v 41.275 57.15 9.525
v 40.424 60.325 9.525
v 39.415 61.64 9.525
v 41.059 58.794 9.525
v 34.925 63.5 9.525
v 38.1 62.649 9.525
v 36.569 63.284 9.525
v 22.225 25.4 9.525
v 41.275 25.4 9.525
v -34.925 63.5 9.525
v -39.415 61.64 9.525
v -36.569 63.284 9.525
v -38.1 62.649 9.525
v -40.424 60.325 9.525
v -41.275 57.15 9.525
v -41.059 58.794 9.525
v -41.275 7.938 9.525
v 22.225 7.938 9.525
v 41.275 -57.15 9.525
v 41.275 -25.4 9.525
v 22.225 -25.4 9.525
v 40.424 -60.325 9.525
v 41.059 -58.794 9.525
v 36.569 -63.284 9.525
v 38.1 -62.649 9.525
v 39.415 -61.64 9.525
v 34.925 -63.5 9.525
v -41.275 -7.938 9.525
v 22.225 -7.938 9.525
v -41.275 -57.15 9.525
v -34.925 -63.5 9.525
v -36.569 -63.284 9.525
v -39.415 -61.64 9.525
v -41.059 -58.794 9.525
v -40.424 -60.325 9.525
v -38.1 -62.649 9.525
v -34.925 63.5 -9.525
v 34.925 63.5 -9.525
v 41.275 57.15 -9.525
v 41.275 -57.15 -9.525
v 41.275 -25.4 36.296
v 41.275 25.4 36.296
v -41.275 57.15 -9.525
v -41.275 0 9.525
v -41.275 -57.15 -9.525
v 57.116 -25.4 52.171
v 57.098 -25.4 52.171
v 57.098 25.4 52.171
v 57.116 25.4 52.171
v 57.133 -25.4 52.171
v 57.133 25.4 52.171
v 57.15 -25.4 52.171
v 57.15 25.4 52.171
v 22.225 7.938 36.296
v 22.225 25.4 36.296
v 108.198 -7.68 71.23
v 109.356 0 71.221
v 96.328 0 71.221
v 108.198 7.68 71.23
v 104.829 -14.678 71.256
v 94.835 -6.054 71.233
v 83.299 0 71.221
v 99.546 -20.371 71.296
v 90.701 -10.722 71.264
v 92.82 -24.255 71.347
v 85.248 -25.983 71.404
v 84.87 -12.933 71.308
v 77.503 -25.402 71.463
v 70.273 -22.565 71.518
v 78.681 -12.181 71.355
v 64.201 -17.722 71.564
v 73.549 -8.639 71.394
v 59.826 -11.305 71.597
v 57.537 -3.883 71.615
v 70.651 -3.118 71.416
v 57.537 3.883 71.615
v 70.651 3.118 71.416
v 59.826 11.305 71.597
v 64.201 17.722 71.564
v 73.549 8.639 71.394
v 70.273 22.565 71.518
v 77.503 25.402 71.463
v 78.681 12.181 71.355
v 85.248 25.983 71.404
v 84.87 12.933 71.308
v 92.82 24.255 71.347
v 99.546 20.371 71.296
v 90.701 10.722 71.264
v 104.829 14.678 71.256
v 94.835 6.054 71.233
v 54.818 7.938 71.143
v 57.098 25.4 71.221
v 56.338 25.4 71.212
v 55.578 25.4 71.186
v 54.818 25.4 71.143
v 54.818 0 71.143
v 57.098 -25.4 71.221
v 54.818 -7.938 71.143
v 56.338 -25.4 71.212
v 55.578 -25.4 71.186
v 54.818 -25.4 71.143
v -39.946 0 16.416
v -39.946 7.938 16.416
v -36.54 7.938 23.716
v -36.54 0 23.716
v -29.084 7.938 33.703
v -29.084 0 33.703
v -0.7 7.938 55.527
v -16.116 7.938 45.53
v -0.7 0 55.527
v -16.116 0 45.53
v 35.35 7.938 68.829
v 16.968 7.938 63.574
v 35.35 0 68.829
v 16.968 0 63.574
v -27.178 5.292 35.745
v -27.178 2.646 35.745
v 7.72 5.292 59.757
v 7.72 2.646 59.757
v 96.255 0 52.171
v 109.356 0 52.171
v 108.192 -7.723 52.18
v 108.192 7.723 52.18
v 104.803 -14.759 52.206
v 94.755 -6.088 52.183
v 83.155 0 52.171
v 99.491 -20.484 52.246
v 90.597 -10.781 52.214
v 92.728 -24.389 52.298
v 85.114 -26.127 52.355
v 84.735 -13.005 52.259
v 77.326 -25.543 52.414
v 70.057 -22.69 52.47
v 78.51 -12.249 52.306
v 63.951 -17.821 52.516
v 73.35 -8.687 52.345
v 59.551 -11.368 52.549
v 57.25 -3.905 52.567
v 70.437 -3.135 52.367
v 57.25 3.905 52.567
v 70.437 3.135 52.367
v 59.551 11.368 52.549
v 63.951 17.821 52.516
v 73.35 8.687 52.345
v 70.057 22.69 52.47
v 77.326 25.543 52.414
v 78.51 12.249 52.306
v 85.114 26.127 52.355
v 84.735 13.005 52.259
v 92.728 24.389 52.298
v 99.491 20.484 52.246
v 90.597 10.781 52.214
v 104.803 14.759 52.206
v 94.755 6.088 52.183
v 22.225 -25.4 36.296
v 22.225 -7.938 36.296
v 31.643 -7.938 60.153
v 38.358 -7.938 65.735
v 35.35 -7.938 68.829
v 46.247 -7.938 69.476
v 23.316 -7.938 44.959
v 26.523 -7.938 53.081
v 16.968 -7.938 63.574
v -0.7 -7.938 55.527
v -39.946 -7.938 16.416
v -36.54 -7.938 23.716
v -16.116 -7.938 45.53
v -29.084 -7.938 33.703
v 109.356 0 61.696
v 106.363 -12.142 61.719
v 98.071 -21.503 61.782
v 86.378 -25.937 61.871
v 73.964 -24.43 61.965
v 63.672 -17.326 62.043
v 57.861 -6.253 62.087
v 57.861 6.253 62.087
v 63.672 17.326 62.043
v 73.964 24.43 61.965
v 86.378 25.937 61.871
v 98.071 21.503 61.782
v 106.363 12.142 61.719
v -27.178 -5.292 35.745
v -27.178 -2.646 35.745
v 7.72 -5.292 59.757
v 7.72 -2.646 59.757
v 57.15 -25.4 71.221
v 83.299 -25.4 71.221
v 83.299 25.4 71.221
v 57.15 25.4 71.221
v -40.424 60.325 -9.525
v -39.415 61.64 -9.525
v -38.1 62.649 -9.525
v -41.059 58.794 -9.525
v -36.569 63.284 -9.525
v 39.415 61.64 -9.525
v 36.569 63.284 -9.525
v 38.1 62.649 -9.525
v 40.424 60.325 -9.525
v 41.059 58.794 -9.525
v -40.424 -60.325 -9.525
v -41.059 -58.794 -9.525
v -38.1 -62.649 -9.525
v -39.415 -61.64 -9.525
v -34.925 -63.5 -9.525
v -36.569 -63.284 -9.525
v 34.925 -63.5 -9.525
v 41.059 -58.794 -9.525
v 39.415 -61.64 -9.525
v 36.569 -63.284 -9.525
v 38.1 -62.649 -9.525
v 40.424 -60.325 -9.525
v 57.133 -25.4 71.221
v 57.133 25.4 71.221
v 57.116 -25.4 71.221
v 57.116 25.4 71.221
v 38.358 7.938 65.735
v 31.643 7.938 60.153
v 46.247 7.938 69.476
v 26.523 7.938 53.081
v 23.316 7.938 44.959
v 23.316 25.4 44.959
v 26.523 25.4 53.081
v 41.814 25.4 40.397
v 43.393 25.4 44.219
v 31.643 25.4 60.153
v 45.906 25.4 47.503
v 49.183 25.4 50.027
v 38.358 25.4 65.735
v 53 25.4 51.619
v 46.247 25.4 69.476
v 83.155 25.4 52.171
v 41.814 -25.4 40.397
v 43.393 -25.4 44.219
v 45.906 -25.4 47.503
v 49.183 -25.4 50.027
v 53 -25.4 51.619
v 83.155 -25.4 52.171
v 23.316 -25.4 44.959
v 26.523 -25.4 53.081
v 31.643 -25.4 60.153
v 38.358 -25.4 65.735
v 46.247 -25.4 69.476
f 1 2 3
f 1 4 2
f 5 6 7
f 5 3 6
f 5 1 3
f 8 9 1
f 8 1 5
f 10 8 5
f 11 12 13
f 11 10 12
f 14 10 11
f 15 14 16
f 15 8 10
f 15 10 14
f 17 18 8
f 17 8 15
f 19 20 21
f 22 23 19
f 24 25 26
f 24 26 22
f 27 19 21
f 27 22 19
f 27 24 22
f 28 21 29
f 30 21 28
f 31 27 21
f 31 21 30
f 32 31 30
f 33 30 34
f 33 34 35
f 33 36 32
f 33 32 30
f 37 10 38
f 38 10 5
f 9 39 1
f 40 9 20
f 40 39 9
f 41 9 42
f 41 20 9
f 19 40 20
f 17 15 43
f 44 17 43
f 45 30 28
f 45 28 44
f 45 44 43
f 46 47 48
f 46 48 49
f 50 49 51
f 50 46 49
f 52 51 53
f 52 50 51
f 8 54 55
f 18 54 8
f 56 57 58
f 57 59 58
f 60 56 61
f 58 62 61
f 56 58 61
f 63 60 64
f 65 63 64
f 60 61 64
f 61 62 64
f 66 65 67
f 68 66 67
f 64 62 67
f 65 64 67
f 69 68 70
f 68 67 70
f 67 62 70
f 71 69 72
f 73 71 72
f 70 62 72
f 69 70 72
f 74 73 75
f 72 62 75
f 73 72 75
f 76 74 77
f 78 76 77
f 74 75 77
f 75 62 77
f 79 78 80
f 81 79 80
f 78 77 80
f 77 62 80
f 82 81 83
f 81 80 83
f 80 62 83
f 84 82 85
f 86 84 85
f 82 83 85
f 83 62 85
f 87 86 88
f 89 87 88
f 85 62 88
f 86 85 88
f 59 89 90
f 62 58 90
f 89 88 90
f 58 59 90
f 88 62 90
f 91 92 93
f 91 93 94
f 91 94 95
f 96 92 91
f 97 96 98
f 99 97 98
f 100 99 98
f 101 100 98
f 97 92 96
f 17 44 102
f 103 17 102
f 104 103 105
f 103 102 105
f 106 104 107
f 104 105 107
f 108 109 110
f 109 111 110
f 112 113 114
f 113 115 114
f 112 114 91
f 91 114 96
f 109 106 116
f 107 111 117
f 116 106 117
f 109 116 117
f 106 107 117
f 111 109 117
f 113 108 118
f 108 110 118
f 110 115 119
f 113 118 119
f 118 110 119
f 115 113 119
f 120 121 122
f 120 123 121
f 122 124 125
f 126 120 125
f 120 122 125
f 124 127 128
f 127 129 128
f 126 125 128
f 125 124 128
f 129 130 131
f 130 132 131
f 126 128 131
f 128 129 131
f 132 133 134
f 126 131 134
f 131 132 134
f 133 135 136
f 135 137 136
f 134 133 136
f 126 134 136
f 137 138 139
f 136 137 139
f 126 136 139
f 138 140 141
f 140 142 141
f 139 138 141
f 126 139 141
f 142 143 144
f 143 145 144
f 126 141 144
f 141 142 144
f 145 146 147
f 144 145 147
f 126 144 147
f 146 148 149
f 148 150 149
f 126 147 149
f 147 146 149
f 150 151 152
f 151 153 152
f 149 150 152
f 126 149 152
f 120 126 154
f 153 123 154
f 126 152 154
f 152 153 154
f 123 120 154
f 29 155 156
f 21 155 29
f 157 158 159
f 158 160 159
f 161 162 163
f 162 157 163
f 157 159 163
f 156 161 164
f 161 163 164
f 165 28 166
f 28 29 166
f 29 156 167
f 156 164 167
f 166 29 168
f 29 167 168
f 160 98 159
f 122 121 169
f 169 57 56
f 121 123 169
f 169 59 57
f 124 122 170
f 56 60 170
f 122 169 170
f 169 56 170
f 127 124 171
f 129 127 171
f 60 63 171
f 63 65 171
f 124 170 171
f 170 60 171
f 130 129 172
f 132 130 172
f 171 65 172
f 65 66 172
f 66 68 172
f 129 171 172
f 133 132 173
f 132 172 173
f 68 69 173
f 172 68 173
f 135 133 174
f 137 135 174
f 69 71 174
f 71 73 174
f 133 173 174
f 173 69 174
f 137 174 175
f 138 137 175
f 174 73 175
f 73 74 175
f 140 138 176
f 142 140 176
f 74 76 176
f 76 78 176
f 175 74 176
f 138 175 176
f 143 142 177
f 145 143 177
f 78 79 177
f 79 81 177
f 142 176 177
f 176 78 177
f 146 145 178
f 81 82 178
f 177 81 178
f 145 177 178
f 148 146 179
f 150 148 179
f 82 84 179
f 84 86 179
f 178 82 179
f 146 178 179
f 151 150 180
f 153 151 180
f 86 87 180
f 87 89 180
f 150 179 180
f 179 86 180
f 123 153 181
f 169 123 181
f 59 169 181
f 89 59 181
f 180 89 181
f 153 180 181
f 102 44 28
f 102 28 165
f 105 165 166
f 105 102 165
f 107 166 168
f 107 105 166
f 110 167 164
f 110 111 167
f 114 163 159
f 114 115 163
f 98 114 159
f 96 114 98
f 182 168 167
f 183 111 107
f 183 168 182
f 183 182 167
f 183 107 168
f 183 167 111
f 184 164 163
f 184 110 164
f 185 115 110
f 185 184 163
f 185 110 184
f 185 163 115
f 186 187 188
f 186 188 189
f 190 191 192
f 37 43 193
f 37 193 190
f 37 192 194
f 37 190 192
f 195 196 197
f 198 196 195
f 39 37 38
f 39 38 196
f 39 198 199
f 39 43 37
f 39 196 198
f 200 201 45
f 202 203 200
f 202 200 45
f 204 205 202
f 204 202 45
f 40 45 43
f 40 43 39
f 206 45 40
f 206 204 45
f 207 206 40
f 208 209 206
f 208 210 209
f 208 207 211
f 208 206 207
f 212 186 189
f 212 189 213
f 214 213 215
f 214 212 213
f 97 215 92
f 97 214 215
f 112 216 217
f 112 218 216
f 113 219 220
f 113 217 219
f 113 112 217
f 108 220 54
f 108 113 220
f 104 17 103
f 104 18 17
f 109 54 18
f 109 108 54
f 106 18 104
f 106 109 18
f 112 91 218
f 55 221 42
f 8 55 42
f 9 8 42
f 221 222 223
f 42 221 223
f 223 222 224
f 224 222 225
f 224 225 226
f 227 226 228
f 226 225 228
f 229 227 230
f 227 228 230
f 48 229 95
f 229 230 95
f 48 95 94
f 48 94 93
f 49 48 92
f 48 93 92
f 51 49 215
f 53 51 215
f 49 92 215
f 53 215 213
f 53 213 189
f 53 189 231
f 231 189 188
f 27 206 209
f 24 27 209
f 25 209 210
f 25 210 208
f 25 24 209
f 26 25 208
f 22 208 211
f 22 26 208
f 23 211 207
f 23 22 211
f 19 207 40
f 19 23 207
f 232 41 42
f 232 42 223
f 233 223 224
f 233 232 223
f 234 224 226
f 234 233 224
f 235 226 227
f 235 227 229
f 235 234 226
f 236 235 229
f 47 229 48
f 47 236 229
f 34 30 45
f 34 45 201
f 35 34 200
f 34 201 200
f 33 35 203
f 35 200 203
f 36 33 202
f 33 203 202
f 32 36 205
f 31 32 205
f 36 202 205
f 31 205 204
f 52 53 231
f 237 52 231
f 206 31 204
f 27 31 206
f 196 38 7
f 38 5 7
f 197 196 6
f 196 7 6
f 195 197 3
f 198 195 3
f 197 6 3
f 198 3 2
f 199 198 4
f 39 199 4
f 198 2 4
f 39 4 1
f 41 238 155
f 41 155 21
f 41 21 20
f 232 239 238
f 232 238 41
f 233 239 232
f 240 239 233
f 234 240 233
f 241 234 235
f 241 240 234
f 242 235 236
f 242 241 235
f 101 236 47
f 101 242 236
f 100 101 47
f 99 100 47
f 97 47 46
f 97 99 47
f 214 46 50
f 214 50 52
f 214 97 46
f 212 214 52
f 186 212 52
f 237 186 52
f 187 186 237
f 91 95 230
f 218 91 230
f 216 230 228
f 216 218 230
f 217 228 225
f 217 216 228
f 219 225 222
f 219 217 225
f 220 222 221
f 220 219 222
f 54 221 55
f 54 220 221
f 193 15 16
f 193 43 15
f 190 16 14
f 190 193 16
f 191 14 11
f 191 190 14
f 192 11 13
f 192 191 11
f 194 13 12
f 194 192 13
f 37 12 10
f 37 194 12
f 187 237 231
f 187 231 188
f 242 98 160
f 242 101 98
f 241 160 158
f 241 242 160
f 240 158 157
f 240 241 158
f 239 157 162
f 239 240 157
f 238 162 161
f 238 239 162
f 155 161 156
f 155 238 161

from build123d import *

# Parameters (mm, degrees)
F1_DEPTH = 63.5
F2_DEPTH = 25.4
F3_DEPTH = 7.9375
F5_R     = 6.35


# Not quite as in the source:
# - ends of sketch curves that miss each other by under 0.0002 mm in the source are joined


with BuildPart() as f1:
    # F0 (on Front) → F1 (new body, symmetric)
    with BuildSketch(Plane.XZ):
        Polygon((22.225, 9.525), (-41.275, 9.525), (-41.275, -9.525), (41.275, -9.525), (41.275, 9.525), align=None)
    extrude(amount=F1_DEPTH, both=True)

    # F0 (on Front) → F2 (join, symmetric)
    with BuildSketch(Plane.XZ):
        with BuildLine():
            Line((22.225, 36.2963777006), (22.225, 9.525))
            Line((22.225, 9.525), (41.275, 9.525))
            Line((41.275, 9.525), (41.275, 36.2963777006))
            ThreePointArc((41.275, 36.2963777006), (45.9064737786, 47.5034622059), (57.0984636988, 52.1712940471))
            Line((57.0984636988, 52.1712940471), (57.0984634272, 71.2213777006))
            ThreePointArc((57.0984634272, 71.2213777006), (55.9576218184, 71.2010172098), (54.8180528643, 71.1434385172))
            ThreePointArc((54.8180528643, 71.1434385172), (31.6431491682, 60.1533721811), (22.225, 36.2963777006))
        make_face()
        with BuildLine():
            ThreePointArc((57.15, 71.2213777006), (57.1242317347, 71.2213681944), (57.0984634834, 71.221339676))
            Line((57.0984634834, 71.221339676), (57.0984634272, 52.1713777006))
            ThreePointArc((57.0984634272, 52.1713777006), (57.1242318155, 52.1713567872), (57.15, 52.1713777006))
            Line((57.15, 52.1713777006), (83.1548832357, 52.1713777006))
            Line((83.1548832357, 52.1713777006), (83.2994319499, 71.2213777006))
            Line((83.2994319499, 71.2213777006), (57.15, 71.2213777006))
        make_face()
    extrude(amount=F2_DEPTH, both=True)

    # F0 (on Front) → F3 (join, symmetric)
    with BuildSketch(Plane.XZ):
        with BuildLine():
            add(Edge.make_bspline(
                [(-41.275, 9.525), (-40.4461435974, 33.376108855), (4.4869781457, 69.5420511852), (54.8180528643, 71.1434385172)],
                knots=[0, 0, 0, 0, 114.1521211983, 114.1521211983, 114.1521211983, 114.1521211983], degree=3))
            Line((-41.275, 9.525), (22.225, 9.525))
            Line((22.225, 9.525), (22.225, 36.2963777006))
            ThreePointArc((22.225, 36.2963777006), (31.6431491682, 60.1533721811), (54.8180528643, 71.1434385172))
        make_face()
    extrude(amount=F3_DEPTH, both=True)

    # F5
    f5_edges = [f1.edges().sort_by_distance(p)[0] for p in [
        (41.275, -63.5, 0),
        (-41.275, -63.5, 0),
        (41.275, 63.5, 0),
        (-41.275, 63.5, 0),
    ]]
    fillet(f5_edges, radius=F5_R)


with BuildPart() as f4:
    # F0 (on Front) → F4 (revolve)
    with BuildSketch(Plane.XZ):
        Polygon((109.3558517583, 71.2213777006), (83.2994319499, 71.2213777006), (83.1548832357, 52.1713777006), (109.3558517583, 52.1713777006), align=None)
    revolve(axis=Axis((83.2271575928, 0, 61.6963777006), (-0.0075876406, 0, -0.9999712134)))


solid = Compound([f1.part, f4.part])
